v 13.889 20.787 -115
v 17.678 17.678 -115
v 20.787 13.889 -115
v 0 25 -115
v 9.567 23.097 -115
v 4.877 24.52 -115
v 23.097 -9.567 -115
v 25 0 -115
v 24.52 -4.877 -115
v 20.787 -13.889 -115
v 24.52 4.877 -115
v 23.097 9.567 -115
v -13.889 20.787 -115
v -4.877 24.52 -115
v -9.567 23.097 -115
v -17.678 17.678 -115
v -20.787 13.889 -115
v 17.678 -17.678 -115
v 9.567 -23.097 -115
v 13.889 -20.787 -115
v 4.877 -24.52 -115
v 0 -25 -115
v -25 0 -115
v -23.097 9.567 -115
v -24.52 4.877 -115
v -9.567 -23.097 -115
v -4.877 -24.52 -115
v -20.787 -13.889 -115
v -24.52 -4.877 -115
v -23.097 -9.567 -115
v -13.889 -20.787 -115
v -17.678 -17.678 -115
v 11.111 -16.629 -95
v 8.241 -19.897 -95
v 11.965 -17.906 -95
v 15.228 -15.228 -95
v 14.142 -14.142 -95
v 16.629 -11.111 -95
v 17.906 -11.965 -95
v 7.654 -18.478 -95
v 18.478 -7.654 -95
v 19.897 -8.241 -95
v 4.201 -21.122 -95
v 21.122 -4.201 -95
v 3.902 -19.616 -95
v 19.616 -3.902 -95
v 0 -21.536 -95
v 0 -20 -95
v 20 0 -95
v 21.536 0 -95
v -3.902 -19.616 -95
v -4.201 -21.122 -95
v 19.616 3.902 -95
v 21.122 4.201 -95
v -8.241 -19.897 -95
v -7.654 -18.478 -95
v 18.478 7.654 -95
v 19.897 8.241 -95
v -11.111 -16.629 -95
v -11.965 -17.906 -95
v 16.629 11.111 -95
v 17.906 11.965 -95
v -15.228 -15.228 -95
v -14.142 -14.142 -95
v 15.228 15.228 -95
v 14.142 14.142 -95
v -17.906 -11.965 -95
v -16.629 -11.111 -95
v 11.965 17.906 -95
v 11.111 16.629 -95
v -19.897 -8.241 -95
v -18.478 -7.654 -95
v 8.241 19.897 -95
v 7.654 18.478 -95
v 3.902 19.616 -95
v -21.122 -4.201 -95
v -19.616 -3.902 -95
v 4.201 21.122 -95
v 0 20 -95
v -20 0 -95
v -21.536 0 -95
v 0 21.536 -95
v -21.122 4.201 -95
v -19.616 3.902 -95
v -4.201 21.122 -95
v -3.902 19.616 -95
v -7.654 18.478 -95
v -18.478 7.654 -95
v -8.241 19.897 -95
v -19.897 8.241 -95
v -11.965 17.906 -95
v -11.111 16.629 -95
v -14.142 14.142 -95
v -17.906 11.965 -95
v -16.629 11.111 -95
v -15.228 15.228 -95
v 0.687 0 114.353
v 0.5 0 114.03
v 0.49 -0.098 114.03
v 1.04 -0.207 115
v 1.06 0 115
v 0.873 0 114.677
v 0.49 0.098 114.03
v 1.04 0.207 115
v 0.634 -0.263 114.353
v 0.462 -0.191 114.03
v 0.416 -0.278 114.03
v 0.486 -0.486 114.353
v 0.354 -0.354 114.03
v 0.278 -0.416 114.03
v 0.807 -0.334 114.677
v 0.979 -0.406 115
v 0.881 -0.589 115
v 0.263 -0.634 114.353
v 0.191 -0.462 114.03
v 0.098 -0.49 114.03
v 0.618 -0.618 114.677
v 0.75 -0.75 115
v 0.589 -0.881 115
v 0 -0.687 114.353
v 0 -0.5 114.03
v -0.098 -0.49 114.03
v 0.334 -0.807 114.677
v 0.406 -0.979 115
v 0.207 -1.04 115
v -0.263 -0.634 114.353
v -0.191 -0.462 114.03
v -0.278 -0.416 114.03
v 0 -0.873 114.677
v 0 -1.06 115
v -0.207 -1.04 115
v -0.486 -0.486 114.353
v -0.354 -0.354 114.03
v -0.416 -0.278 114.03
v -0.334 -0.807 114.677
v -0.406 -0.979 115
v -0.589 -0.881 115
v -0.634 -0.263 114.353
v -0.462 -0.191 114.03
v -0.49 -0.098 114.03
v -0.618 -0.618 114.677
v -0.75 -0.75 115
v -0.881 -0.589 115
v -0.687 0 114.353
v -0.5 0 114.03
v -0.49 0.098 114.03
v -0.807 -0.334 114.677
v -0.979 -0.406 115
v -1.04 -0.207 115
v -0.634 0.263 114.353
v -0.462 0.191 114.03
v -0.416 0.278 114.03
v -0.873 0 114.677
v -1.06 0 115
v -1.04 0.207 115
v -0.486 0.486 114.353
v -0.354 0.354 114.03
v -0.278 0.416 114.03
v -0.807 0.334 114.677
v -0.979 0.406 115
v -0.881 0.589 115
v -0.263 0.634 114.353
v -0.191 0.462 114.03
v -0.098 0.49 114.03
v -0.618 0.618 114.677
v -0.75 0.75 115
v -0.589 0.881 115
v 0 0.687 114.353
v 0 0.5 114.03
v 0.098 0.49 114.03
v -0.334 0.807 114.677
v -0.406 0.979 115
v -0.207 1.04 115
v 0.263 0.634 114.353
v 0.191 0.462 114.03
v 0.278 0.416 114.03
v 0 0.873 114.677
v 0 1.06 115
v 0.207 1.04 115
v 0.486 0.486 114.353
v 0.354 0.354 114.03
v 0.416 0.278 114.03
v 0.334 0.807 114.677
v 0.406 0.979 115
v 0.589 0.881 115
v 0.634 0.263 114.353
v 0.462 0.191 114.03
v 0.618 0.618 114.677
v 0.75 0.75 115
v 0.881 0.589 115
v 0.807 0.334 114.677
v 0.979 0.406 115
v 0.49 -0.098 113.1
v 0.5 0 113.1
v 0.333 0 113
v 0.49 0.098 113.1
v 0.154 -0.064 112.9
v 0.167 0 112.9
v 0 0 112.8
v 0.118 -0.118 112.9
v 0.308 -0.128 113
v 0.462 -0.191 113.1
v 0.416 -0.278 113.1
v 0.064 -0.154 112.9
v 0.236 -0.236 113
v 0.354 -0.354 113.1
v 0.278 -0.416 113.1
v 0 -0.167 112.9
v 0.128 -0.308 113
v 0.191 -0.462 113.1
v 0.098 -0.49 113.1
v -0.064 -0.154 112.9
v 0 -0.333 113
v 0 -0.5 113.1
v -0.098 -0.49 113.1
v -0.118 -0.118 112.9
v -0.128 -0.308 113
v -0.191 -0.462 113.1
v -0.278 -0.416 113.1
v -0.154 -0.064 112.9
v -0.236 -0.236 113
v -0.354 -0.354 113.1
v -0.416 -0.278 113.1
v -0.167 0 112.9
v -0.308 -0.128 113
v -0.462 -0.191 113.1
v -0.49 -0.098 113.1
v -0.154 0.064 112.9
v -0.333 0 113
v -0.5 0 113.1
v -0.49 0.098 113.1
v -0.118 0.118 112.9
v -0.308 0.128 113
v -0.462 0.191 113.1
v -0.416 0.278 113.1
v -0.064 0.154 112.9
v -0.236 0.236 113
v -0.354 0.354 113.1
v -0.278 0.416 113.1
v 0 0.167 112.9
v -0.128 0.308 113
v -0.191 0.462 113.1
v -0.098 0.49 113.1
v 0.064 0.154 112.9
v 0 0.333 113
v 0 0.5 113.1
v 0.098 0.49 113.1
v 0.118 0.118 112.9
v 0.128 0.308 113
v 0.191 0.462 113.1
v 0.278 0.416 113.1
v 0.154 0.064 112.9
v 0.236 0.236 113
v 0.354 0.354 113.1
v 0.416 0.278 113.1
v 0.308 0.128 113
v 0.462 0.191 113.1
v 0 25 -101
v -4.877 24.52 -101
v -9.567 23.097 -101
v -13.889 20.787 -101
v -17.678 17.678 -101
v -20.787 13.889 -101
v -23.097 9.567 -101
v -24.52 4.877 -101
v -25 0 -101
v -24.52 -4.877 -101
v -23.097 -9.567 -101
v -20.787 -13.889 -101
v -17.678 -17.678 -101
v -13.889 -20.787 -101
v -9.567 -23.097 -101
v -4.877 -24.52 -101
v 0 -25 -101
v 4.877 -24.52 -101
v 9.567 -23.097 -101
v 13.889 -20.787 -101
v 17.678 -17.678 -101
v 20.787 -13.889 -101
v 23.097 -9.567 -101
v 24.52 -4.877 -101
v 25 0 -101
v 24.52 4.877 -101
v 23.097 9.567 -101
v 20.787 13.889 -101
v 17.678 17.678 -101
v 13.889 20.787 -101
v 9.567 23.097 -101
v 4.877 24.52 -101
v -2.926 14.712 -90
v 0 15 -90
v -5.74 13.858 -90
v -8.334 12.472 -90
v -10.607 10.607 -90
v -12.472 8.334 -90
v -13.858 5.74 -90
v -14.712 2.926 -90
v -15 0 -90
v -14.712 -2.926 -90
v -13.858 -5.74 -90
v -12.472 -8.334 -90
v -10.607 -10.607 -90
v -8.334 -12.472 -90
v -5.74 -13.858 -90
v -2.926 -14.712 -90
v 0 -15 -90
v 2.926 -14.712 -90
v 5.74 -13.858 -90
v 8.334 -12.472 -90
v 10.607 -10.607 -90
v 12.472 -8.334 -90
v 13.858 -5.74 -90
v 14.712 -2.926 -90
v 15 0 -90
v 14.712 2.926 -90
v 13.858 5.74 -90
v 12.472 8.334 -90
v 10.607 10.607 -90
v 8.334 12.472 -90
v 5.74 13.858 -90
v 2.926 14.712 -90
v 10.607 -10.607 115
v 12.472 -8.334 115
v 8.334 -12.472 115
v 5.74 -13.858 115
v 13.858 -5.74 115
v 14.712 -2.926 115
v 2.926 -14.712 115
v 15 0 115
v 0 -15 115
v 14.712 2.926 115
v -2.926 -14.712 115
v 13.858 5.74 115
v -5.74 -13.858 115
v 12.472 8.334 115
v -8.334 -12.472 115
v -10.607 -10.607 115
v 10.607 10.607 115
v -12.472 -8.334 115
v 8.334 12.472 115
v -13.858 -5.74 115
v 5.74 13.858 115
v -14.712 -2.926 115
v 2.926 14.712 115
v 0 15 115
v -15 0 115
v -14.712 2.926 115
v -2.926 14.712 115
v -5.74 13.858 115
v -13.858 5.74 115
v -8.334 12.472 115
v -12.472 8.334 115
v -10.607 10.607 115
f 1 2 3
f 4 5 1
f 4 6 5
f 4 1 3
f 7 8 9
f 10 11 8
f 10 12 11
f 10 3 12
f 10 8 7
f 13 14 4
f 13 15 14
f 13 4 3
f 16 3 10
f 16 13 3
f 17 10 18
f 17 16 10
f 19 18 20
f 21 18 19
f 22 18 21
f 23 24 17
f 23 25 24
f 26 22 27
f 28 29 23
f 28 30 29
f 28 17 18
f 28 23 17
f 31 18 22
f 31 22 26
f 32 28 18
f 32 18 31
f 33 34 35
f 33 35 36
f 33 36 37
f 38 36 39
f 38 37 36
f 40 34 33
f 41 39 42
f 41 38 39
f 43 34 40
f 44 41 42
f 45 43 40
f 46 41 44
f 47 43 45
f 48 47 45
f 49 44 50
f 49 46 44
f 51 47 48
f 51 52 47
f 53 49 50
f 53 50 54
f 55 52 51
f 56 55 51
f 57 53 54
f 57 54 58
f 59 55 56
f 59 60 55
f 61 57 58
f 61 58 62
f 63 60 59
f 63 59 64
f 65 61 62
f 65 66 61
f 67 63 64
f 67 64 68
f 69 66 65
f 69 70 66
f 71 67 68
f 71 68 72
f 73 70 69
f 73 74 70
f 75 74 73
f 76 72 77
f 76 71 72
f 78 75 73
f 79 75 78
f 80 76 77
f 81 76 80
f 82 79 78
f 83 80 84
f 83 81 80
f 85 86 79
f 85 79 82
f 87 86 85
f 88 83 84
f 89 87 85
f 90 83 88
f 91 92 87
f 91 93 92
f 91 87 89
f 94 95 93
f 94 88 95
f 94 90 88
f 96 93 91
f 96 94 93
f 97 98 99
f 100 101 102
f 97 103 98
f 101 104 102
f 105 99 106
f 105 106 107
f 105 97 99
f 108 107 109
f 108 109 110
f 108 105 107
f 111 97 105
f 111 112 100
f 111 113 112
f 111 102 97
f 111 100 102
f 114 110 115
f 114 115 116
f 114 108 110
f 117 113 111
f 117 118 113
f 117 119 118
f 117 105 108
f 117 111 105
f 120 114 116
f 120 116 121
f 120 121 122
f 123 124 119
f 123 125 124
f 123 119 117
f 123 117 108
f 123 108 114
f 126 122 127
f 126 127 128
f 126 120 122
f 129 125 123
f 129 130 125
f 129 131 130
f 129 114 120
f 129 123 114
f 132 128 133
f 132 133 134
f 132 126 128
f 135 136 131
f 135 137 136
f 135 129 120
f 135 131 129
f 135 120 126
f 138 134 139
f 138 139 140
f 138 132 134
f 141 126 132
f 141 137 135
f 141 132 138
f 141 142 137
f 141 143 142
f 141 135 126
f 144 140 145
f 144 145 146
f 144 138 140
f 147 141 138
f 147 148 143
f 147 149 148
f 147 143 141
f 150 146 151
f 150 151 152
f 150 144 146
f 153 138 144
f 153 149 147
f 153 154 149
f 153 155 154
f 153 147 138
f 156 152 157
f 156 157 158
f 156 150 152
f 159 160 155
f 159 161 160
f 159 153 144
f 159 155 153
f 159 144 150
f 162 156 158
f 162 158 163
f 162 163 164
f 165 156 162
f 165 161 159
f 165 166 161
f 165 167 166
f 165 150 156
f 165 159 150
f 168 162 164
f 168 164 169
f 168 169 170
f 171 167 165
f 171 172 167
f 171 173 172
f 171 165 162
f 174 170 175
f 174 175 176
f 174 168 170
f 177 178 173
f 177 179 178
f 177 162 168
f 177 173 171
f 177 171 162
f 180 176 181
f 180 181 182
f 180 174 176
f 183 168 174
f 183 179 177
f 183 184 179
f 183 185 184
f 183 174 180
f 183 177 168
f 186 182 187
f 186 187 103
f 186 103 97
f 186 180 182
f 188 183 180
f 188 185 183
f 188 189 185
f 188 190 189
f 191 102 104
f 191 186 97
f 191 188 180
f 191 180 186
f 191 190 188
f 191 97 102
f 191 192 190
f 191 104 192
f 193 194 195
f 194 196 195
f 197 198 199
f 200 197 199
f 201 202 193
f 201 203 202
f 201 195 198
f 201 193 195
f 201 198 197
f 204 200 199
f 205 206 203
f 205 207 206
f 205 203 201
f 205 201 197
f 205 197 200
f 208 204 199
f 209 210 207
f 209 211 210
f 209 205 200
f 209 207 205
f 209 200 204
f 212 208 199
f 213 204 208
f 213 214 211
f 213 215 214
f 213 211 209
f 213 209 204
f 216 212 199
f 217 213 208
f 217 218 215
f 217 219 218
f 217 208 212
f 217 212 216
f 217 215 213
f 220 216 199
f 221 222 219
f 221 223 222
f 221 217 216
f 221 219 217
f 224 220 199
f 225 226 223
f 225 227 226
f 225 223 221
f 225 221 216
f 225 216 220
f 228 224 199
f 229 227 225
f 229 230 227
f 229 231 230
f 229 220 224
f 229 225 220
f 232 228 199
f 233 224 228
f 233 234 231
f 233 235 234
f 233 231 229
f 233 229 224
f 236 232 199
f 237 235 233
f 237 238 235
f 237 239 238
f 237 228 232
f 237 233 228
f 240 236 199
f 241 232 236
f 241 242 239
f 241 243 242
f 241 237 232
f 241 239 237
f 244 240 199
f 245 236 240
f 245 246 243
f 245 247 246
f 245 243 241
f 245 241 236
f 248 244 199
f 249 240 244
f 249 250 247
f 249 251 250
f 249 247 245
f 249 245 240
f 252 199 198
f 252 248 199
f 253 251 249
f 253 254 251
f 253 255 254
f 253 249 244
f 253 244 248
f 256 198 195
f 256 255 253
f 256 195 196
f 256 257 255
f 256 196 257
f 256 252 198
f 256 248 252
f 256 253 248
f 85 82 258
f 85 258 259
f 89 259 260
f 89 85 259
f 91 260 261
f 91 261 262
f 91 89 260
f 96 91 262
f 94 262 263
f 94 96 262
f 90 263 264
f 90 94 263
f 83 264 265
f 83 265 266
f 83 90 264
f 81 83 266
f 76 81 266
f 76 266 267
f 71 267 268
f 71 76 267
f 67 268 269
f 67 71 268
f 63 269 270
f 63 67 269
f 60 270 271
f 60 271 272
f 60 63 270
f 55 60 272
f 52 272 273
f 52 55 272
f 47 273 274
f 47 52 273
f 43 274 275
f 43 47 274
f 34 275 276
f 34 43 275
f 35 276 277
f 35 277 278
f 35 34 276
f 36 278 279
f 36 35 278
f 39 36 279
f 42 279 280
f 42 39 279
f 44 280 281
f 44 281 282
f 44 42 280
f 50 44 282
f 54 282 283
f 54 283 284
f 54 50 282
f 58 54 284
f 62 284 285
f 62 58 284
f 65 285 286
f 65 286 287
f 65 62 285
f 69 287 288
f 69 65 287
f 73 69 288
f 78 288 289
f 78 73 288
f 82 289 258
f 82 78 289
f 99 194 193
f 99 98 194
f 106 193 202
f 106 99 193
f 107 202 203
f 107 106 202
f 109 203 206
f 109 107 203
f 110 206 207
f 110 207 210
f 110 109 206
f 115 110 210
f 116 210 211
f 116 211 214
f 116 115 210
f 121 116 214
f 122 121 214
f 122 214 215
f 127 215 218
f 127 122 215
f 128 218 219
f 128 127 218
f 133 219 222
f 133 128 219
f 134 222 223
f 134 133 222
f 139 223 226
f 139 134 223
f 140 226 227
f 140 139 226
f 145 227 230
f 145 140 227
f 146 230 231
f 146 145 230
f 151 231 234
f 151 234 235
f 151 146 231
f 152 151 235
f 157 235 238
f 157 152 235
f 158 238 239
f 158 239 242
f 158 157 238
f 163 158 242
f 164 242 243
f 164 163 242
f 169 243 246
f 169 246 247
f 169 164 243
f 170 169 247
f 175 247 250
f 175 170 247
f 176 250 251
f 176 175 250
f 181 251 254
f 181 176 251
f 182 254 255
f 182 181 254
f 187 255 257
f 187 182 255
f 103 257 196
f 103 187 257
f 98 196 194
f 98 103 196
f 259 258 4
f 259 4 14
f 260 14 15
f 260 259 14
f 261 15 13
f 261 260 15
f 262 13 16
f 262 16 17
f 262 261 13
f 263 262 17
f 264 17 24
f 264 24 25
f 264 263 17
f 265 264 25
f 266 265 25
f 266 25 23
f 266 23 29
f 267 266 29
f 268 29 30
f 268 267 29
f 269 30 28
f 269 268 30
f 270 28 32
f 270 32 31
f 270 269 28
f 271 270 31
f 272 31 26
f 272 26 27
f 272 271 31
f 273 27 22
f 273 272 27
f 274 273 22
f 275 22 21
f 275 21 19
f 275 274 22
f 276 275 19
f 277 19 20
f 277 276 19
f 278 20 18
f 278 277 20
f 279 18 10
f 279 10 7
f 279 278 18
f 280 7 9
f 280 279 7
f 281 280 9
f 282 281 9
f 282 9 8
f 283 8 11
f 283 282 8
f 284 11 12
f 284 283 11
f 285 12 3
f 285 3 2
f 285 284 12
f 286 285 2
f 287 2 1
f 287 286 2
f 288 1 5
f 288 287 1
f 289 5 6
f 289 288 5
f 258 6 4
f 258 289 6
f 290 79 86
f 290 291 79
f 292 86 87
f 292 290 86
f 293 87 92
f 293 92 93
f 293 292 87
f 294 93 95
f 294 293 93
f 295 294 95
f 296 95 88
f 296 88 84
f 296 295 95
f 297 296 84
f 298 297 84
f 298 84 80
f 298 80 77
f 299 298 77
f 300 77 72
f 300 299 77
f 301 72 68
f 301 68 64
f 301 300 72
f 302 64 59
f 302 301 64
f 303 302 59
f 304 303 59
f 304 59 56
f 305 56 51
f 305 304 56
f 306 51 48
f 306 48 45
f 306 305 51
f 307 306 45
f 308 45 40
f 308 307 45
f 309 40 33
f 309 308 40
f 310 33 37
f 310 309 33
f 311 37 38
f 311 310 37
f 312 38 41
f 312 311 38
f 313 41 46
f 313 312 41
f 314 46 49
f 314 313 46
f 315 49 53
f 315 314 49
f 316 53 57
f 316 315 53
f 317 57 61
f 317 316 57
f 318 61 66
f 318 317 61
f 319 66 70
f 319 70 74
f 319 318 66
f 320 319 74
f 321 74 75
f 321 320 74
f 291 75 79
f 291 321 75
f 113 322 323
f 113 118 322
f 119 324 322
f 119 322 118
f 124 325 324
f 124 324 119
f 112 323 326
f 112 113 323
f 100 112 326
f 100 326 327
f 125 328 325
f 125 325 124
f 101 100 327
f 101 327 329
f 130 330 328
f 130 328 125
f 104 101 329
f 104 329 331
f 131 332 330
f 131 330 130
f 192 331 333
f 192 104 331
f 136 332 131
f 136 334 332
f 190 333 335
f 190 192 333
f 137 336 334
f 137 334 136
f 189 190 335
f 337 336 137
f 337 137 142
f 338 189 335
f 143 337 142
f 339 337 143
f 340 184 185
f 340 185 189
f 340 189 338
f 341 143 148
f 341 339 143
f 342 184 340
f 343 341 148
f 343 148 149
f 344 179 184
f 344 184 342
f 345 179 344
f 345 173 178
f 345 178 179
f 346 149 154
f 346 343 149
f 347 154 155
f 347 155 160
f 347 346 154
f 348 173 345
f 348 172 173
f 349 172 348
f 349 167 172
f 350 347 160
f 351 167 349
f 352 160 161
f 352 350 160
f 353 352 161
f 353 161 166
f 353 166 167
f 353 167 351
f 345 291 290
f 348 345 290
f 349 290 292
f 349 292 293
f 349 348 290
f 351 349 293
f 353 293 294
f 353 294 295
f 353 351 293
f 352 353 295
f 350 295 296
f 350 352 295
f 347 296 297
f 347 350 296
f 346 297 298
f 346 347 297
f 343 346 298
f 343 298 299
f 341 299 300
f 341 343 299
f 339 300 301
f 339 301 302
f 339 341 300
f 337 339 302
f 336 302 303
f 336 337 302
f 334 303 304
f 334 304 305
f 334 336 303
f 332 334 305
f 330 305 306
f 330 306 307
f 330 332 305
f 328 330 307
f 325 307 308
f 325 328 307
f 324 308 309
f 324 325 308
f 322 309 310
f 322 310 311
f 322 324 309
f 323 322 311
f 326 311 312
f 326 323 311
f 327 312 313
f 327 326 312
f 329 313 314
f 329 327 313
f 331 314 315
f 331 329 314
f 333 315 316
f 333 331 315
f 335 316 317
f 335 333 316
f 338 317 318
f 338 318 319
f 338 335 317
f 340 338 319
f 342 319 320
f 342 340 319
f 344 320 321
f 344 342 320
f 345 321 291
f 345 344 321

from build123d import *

# Parameters (mm, degrees)
FASE1_SIZE  = 6
FASE1_SIZE2 = 3.464101615


with BuildPart() as part:
    # Skizze1 → Rotation1 (revolve)
    with BuildSketch(Plane(origin=(0, 0, 0), x_dir=(0, 0, -1), z_dir=(1, 0, 0))):
        Polygon((115, 0), (115, 25), (95, 25), (95, 20), (90, 15), (-115, 15), (-115, 0), align=None)
    revolve(axis=Axis((0, 0, -115), (0, 0, 1)))

    # Fase1
    fase1_edges = [part.edges().sort_by_distance(p)[0] for p in [
        (0, -25, -95),
    ]]
    fase1_side = [part.faces().sort_by_distance(p)[0] for p in [
        (0, -25, -105),
    ]]
    chamfer(fase1_edges, length=FASE1_SIZE, length2=FASE1_SIZE2, reference=fase1_side[0])

    # Skizze3 → Schnitt-Rotation1 (revolve, cut)
    with BuildSketch(Plane(origin=(0, 0, 115), x_dir=(1, 0, 0), z_dir=(0, -1, 0))):
        Polygon((0, -2.20043031), (0.5, -1.9), (0.5, -0.969948452), (1.06, 0), (0, 0), align=None)
    revolve(axis=Axis((0, 0, 115), (0, 0, -1)), mode=Mode.SUBTRACT)


solid = part.part
